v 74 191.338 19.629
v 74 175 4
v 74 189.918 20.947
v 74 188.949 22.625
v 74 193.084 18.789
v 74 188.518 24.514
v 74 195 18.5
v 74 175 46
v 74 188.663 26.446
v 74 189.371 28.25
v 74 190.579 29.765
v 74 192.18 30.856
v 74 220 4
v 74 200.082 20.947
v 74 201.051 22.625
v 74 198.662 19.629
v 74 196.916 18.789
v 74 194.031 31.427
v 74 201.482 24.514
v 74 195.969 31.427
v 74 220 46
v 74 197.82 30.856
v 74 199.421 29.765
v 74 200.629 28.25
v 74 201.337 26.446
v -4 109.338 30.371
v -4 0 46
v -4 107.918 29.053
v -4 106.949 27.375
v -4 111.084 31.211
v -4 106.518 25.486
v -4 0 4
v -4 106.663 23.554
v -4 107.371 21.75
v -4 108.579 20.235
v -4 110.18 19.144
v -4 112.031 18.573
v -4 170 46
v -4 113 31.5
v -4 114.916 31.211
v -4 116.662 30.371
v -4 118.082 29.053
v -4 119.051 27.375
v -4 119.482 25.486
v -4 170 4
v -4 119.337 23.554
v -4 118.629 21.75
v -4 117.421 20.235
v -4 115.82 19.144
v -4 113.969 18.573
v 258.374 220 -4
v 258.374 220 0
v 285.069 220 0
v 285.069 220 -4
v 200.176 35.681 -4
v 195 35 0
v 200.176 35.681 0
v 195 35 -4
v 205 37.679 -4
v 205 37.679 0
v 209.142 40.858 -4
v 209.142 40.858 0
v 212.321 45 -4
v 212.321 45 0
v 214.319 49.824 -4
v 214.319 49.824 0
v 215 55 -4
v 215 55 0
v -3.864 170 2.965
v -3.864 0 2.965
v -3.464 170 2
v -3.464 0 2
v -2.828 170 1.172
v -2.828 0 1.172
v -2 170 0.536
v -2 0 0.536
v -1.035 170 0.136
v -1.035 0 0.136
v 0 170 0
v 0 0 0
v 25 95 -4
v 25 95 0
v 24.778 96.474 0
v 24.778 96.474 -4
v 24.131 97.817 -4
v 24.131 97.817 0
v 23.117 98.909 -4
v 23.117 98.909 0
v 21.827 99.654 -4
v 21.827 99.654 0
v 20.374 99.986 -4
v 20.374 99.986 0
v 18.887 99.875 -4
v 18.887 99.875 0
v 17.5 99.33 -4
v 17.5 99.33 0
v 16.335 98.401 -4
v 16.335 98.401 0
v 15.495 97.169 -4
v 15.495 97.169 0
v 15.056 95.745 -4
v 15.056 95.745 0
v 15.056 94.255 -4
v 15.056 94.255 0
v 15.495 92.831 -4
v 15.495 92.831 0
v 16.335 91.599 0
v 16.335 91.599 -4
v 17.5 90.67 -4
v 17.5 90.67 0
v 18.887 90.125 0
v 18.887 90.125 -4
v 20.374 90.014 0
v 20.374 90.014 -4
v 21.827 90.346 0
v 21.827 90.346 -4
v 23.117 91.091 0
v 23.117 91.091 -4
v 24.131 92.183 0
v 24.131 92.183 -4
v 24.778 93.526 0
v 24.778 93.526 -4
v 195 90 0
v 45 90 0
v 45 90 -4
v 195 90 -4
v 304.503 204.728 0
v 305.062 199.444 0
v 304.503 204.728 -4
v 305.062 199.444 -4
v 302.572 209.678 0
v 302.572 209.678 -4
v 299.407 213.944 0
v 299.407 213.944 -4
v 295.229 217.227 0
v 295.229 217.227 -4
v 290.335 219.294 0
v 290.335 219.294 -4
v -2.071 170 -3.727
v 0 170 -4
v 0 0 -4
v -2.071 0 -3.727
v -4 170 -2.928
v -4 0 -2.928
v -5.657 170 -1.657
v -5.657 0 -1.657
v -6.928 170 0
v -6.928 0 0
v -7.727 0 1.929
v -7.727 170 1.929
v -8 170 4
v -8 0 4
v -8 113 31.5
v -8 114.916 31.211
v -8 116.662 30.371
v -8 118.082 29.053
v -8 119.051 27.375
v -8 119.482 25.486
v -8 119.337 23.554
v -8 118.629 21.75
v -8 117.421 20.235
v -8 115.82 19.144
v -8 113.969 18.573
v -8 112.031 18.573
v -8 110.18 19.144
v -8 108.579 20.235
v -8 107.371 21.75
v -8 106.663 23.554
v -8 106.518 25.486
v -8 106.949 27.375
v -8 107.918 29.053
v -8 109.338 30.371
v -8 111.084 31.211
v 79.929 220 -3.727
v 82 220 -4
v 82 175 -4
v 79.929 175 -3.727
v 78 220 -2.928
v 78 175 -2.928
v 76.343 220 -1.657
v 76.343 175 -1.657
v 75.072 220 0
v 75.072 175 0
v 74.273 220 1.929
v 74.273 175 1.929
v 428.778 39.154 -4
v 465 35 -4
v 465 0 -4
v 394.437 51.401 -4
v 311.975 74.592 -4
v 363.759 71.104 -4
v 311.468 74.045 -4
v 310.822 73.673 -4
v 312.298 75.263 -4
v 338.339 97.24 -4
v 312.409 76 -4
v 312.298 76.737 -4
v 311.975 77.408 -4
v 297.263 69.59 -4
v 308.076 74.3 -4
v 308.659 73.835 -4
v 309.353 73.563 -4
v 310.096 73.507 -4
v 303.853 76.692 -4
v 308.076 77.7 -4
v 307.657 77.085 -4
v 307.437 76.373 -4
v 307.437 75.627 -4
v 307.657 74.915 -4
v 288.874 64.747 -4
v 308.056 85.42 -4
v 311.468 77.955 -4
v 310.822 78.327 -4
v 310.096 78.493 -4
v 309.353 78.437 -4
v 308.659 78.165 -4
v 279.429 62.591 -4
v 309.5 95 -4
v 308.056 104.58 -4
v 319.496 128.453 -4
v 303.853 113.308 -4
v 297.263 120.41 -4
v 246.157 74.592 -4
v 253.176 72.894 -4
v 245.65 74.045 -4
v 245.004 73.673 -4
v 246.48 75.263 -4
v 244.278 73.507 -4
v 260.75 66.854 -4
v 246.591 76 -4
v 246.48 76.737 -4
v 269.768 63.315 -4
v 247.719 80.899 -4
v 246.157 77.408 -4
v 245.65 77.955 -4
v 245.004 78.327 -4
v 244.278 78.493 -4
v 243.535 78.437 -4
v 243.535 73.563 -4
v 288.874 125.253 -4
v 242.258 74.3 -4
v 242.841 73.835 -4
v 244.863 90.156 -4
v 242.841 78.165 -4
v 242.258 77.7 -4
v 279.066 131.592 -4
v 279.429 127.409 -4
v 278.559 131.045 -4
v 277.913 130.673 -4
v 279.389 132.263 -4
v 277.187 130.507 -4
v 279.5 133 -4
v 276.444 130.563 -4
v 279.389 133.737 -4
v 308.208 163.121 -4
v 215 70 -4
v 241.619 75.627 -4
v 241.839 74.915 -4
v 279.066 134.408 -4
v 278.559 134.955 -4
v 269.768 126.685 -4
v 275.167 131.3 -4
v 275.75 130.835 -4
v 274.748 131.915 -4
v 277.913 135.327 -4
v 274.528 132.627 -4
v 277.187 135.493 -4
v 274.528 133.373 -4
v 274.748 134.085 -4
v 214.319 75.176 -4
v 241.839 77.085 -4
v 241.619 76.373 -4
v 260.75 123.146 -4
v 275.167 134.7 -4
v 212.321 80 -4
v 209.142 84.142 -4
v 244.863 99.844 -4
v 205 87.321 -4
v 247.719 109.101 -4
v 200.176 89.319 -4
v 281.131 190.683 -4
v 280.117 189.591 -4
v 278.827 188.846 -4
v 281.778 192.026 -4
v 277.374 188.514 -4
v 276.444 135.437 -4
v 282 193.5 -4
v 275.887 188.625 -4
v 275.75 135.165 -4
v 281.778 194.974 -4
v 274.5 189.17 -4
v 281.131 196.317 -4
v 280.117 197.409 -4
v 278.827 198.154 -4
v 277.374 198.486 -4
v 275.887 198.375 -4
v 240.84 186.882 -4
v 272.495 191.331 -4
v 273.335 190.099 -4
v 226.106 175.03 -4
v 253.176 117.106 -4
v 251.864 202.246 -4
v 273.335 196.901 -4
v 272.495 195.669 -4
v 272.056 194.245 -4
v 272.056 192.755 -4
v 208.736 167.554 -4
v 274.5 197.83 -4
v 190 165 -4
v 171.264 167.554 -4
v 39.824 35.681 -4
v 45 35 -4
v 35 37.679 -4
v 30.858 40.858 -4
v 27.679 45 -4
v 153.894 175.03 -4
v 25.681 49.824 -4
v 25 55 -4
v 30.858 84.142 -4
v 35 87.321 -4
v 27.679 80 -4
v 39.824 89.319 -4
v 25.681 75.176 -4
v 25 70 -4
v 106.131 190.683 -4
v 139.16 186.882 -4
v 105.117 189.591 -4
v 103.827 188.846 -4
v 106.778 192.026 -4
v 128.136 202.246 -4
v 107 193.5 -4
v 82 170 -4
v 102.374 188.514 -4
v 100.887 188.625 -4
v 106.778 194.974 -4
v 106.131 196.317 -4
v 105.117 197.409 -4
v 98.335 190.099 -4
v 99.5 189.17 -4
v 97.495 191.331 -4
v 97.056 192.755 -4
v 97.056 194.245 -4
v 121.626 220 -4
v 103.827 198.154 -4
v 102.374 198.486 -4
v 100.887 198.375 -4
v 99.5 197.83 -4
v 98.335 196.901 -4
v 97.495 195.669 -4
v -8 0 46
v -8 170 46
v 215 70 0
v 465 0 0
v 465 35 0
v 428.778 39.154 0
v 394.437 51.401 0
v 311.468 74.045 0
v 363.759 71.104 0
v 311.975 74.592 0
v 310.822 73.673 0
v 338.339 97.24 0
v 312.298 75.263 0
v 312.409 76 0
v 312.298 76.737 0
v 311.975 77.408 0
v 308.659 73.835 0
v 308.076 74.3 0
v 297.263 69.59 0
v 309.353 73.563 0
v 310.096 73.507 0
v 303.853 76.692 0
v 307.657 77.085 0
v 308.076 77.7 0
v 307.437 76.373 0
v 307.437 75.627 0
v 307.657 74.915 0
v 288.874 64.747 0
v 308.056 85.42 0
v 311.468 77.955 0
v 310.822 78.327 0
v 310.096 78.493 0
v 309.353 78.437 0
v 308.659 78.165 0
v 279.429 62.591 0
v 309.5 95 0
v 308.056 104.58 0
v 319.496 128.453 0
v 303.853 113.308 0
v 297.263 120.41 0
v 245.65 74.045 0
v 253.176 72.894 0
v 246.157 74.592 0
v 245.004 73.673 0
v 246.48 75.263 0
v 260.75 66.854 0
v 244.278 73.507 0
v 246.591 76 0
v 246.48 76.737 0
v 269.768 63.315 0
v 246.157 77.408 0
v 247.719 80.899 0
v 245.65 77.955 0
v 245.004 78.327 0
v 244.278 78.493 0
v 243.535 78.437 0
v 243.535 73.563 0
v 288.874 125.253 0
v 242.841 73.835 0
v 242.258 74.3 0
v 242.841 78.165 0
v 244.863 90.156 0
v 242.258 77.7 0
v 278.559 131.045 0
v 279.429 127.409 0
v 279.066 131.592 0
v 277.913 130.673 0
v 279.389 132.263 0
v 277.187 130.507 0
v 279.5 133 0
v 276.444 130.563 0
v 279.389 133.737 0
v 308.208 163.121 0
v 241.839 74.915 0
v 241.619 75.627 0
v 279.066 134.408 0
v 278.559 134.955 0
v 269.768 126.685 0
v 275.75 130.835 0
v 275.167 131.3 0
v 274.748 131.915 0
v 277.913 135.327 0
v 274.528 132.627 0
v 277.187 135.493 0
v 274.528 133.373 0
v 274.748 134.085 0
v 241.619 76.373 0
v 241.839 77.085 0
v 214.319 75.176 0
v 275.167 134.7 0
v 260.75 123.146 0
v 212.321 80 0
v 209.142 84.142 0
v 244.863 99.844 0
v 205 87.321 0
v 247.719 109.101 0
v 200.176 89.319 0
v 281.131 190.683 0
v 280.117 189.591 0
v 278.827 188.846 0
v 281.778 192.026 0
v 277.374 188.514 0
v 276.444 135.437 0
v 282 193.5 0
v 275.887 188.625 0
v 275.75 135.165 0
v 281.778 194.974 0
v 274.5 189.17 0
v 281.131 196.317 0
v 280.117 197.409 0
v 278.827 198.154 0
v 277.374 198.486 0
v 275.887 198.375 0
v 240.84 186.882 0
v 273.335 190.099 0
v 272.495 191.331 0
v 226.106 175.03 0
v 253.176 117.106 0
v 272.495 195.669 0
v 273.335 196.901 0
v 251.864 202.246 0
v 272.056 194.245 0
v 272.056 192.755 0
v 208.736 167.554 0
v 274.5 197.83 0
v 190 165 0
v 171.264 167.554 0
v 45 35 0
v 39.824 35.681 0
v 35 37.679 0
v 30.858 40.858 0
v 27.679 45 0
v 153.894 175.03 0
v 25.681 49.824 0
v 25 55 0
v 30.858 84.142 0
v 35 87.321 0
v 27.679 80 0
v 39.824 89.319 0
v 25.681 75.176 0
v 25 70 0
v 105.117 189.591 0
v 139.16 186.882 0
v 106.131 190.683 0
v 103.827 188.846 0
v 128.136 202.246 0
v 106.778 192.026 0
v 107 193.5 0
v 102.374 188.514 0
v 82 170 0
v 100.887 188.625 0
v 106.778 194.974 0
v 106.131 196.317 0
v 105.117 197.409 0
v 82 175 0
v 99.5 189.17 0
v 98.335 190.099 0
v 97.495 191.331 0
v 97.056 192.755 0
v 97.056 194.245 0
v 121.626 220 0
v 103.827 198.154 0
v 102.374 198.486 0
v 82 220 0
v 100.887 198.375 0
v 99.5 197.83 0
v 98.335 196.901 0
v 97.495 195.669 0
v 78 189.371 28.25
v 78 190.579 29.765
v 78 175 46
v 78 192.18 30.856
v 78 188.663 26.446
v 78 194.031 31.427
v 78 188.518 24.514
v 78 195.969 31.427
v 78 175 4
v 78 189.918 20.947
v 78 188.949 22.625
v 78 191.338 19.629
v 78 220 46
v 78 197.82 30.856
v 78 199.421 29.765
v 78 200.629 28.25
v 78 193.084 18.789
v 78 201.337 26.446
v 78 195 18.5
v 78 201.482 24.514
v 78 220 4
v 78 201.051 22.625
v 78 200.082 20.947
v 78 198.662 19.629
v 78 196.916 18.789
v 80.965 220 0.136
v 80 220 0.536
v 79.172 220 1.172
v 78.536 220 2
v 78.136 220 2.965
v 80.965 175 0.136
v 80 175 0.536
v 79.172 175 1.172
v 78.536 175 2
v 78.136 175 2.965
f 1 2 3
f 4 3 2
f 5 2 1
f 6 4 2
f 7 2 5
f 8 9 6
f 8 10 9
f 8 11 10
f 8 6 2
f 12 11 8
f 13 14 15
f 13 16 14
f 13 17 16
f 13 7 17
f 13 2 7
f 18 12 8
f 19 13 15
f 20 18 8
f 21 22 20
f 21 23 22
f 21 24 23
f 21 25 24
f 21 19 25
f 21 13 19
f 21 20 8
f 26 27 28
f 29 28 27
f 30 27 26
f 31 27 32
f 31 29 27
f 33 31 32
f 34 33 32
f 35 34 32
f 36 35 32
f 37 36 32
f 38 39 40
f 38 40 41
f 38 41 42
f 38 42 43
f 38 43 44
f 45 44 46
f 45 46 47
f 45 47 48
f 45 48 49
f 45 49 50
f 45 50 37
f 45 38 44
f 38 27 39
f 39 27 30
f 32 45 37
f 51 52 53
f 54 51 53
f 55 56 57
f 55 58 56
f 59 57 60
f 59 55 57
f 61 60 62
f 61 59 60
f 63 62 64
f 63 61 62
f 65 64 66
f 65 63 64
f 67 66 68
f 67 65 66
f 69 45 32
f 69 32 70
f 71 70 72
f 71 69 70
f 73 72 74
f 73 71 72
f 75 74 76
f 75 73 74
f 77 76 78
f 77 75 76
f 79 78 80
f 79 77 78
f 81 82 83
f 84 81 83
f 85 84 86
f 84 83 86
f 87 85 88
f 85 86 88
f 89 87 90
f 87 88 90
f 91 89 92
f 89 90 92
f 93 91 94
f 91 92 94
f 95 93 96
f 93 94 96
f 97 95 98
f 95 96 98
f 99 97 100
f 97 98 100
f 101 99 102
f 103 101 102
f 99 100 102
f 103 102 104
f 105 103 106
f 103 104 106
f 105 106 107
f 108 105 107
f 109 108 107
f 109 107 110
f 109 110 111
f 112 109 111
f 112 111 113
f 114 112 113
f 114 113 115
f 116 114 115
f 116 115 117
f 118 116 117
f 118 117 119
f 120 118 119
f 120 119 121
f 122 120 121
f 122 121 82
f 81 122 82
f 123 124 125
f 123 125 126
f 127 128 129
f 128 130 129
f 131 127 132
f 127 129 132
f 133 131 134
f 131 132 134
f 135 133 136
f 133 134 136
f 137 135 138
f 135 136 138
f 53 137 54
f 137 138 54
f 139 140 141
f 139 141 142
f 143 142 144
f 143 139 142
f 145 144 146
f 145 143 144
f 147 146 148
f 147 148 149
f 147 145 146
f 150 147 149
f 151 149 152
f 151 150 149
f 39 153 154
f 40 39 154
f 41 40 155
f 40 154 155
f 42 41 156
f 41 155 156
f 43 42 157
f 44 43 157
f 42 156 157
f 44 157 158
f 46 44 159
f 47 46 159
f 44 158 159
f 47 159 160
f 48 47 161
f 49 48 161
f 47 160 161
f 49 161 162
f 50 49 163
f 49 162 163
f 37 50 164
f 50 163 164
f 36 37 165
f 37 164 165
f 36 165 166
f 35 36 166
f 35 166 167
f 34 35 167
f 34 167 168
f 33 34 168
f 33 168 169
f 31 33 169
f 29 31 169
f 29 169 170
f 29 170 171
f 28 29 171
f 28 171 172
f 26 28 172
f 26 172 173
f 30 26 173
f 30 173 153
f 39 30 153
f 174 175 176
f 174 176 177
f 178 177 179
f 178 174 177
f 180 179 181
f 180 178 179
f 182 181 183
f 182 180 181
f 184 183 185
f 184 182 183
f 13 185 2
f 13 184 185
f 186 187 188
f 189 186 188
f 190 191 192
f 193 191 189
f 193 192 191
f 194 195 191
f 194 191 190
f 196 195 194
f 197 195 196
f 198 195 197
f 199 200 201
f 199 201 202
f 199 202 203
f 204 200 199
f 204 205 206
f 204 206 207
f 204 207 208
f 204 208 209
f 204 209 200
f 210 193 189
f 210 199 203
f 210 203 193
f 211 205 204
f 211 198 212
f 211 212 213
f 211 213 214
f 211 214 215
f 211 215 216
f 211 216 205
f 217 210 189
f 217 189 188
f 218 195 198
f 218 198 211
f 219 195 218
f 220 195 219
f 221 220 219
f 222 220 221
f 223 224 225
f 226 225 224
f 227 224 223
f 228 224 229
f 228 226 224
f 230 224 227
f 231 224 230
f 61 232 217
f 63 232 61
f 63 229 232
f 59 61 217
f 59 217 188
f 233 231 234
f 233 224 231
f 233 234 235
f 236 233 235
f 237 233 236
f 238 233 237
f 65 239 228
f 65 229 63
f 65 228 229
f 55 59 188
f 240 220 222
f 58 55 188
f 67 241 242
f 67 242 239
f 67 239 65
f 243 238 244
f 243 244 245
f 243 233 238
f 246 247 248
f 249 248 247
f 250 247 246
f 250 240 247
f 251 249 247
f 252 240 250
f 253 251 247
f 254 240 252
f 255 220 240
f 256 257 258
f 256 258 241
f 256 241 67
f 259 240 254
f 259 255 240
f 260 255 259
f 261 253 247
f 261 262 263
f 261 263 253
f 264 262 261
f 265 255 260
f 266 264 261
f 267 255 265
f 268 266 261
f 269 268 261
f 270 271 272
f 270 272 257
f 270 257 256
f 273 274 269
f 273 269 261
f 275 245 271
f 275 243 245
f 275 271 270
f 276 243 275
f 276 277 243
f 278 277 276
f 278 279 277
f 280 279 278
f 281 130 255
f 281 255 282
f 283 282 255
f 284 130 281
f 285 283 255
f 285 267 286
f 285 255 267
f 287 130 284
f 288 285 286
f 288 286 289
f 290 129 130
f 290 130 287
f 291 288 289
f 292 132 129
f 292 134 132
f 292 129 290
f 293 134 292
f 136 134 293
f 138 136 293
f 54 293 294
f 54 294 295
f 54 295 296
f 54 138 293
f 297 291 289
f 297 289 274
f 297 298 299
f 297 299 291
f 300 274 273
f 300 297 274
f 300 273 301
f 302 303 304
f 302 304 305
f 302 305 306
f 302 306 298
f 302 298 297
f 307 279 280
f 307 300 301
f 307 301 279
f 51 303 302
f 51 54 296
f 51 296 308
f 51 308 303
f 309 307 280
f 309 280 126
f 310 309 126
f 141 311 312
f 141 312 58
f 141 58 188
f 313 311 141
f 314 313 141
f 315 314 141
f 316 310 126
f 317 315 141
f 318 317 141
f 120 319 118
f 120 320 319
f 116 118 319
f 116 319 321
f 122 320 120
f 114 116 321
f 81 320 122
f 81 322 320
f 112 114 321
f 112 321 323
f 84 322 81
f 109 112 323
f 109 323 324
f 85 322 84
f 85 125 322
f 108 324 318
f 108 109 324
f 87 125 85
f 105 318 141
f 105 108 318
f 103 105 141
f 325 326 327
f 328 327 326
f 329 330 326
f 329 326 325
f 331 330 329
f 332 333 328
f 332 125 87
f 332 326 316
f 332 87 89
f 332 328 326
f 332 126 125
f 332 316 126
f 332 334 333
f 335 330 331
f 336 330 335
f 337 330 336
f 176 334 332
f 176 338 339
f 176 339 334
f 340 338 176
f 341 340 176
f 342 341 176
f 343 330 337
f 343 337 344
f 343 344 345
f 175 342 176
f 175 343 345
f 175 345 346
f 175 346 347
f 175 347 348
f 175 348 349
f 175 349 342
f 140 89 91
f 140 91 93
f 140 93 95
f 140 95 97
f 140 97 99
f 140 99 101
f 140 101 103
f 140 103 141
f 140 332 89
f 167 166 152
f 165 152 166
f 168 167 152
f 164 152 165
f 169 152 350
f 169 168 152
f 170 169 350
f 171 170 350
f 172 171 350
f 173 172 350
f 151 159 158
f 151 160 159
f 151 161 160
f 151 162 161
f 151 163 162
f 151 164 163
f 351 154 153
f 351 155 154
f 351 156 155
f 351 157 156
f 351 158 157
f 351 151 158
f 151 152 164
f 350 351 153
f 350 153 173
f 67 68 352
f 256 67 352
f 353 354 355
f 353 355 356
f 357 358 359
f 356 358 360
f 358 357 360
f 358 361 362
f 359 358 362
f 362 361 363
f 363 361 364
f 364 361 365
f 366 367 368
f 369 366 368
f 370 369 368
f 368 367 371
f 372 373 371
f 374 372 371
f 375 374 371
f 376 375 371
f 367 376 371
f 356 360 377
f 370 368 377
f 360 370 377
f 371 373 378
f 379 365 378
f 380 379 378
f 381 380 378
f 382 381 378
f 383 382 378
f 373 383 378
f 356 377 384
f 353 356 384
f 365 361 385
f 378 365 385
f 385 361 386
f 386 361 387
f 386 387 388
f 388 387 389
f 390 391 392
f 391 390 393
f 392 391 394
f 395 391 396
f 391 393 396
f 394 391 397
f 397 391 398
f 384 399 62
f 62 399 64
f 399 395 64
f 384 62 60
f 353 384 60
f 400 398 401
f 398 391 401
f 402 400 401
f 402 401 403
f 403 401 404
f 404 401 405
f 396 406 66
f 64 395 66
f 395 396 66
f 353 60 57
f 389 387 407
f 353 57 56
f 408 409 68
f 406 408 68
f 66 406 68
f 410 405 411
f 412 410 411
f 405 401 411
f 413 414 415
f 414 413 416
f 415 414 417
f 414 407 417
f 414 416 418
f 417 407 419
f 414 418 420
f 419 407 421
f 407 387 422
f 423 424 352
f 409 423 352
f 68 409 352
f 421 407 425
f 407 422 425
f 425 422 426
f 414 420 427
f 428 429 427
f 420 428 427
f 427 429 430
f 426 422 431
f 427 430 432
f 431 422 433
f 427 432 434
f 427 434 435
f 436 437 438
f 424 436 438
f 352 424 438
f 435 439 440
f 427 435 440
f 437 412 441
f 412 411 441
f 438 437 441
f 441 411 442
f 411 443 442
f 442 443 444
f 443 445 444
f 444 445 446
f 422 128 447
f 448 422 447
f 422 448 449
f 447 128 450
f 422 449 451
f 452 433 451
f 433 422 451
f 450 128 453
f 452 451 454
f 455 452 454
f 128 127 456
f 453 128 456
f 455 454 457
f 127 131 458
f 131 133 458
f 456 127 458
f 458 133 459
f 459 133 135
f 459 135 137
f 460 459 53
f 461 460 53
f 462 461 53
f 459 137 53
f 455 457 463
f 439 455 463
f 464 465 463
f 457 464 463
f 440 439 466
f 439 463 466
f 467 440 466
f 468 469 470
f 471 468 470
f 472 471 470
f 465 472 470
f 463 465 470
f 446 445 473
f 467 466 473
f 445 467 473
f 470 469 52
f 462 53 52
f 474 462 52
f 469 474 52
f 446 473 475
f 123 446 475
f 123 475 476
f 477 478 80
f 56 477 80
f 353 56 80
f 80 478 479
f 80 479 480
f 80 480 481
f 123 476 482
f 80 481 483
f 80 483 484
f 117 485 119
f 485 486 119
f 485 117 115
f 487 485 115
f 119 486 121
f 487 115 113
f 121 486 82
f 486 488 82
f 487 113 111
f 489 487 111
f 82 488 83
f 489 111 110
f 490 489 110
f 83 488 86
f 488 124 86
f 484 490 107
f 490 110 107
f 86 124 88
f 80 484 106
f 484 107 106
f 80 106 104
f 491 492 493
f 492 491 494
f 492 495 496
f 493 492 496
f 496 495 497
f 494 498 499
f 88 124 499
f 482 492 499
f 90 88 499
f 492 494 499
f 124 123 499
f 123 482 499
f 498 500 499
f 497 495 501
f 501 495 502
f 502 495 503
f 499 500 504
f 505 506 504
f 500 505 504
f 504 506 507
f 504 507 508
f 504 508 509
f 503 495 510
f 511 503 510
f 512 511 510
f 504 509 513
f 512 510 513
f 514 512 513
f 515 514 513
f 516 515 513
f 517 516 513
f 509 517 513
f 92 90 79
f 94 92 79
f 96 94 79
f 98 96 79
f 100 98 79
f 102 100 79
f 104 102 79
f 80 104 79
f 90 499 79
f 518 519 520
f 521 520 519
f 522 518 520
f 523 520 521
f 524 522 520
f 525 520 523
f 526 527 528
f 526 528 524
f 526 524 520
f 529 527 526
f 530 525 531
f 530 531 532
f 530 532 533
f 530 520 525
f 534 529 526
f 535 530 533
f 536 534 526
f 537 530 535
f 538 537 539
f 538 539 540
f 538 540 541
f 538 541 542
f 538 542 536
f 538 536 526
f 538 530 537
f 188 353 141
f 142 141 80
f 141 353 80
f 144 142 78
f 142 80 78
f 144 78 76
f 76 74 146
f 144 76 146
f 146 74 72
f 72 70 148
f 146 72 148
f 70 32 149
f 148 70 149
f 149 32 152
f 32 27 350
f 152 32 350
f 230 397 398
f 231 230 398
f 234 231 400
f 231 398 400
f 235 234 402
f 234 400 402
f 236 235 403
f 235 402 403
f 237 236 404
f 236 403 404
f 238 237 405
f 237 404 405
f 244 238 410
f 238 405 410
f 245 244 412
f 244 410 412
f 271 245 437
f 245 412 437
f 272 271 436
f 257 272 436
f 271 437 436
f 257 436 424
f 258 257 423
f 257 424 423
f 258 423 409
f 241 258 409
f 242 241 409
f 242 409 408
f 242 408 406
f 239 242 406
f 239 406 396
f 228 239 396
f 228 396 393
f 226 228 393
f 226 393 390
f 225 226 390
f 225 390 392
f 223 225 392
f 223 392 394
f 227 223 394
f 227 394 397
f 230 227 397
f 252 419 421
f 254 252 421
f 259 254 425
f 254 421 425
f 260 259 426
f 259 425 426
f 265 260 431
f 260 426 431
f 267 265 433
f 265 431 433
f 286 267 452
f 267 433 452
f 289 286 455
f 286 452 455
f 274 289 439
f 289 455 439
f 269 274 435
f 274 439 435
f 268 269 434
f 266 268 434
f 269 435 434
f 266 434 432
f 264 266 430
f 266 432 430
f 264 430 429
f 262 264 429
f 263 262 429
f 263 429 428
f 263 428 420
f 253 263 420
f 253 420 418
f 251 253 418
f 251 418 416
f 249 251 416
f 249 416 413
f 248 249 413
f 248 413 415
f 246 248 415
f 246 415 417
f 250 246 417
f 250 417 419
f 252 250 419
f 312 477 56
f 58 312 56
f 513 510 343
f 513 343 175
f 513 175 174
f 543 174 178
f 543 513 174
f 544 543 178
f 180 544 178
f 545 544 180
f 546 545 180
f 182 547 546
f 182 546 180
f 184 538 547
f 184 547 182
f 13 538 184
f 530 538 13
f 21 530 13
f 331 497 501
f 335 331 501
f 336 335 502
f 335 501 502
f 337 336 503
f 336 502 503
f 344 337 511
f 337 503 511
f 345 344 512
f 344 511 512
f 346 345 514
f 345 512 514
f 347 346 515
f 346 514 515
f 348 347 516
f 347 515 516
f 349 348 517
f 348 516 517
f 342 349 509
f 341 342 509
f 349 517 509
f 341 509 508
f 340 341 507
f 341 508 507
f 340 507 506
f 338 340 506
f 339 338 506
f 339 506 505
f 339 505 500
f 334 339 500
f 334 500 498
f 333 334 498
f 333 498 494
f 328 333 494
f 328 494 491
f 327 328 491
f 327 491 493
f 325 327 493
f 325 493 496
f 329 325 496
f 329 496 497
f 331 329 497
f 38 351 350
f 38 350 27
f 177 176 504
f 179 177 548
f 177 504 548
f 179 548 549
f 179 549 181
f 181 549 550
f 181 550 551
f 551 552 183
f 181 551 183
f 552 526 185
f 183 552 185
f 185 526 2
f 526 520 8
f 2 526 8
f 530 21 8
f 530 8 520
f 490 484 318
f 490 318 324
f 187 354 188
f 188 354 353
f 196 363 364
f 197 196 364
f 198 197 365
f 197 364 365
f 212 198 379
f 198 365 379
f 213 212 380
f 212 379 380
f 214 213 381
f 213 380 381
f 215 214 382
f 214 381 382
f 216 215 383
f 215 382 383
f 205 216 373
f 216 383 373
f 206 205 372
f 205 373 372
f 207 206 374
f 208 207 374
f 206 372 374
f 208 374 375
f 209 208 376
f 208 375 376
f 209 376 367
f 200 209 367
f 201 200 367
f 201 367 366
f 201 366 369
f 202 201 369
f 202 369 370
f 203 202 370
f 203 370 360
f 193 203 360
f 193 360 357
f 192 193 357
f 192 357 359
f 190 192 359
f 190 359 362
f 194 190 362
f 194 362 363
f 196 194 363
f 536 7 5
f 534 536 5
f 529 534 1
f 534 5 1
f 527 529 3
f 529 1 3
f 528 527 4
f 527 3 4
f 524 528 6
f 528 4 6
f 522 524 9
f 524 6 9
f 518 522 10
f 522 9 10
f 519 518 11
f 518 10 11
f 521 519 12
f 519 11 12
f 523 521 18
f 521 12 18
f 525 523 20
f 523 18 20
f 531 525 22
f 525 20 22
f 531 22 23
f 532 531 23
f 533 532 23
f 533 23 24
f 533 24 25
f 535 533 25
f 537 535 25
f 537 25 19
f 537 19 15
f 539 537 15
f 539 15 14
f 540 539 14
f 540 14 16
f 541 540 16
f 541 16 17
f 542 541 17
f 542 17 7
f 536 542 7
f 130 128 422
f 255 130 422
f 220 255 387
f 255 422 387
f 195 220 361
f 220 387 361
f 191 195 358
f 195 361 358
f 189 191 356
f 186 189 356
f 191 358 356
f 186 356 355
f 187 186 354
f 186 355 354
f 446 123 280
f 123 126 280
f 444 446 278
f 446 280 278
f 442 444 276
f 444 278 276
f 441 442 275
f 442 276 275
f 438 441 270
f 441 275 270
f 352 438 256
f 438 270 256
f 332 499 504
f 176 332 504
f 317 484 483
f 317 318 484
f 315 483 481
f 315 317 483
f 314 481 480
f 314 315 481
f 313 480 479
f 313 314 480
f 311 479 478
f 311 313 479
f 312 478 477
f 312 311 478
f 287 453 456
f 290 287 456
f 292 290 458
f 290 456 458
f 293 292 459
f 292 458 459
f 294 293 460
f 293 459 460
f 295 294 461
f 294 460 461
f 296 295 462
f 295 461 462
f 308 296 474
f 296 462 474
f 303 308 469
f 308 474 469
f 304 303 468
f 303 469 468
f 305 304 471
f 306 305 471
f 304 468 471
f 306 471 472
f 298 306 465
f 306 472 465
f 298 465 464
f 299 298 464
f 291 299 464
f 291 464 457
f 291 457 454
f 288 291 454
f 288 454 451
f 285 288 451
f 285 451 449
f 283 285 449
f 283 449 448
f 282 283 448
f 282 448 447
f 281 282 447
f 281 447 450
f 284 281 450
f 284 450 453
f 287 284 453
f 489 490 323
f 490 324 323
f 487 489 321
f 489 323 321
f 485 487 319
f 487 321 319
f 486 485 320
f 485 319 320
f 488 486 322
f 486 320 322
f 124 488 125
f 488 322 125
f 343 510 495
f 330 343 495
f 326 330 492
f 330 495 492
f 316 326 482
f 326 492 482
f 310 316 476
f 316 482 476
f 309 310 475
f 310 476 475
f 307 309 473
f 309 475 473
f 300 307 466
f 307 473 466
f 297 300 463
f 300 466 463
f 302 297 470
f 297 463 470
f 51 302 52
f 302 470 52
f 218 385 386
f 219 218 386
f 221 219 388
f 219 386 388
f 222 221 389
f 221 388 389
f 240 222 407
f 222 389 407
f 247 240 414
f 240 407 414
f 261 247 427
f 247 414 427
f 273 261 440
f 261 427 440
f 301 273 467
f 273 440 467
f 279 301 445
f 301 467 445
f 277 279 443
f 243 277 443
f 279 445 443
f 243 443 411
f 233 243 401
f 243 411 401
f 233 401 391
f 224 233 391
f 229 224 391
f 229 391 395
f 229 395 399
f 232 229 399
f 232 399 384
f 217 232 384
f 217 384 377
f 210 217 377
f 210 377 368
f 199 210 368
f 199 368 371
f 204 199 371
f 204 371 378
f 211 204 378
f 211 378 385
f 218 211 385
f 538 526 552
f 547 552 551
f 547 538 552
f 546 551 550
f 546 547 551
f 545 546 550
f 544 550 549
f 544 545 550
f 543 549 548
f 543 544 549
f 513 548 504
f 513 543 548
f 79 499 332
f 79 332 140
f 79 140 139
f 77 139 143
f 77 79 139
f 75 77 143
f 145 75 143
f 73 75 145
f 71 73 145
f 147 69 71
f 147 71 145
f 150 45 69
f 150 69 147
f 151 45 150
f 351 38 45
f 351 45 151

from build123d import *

# Parameters (mm, degrees)
SKETCH_1_W                  = 190
SKETCH_1_H                  = 55
SM_BASE_FLANGE_1_DEPTH      = 4
SKETCH_6_R                  = 32.5
SKETCH_6_R_2                = 2.5
CUT_EXTRUDE_1_DEPTH         = 10
SKETCH_7_R                  = 5
CUT_EXTRUDE_2_DEPTH         = 10
FILLET_1_R                  = 20
FILLET_2_R                  = 20
SM_EDGE_FLANGE_1_DEPTH      = 45
SM_EDGE_FLANGE_1_BEND_DEPTH = 170
CUT_EXTRUDE_4_REACH         = 525.684
SKETCH_15_R                 = 6.5


# Sheet-metal steps are written as plain solids
with BuildPart() as part:
    # Sketch 1 → 基体-法兰1 (new body)
    with BuildSketch(Plane.XY):
        with BuildLine():
            Line((0, 0), (0, 170))
            Line((0, 170), (82, 170))
            Line((82, 170), (82, 220))
            Line((82, 220), (121.626028344, 220))
            ThreePointArc((121.626028344, 220), (190, 165), (258.373971656, 220))
            Line((258.373971656, 220), (306.965193707, 220))
            ThreePointArc((306.965193707, 220), (343.344749394, 91.076951546), (465, 35))
            Line((465, 35), (465, 0))
            Line((465, 0), (0, 0))
        make_face()
        with Locations((120, 62.5)):
            Rectangle(SKETCH_1_W, SKETCH_1_H, mode=Mode.SUBTRACT)
    extrude(amount=-SM_BASE_FLANGE_1_DEPTH)

    # 草图6 → 切除-拉伸1 (cut)
    with BuildSketch(Plane.XY):
        with Locations((277, 95)):
            Circle(SKETCH_6_R)
        with Locations((277, 133)):
            Circle(SKETCH_6_R_2)
        with Locations((309.908965344, 76)):
            Circle(SKETCH_6_R_2)
        with Locations((244.091034656, 76)):
            Circle(SKETCH_6_R_2)
    extrude(amount=-CUT_EXTRUDE_1_DEPTH, mode=Mode.SUBTRACT)

    # 草图7 → 切除-拉伸2 (cut)
    with BuildSketch(Plane.XY):
        with Locations((20, 95)):
            Circle(SKETCH_7_R)
        with Locations((102, 193.5)):
            Circle(SKETCH_7_R)
        with Locations((277, 193.5)):
            Circle(SKETCH_7_R)
    extrude(amount=-CUT_EXTRUDE_2_DEPTH, mode=Mode.SUBTRACT)

    # 圆角1
    fillet_1_edges = [part.edges().sort_by_distance(p)[0] for p in [
        (25, 35, -2),
        (25, 90, -2),
        (215, 90, -2),
        (215, 35, -2),
    ]]
    fillet(fillet_1_edges, radius=FILLET_1_R)

    # 圆角2
    fillet_2_edges = [part.edges().sort_by_distance(p)[0] for p in [
        (306.965193707, 220, -2),
    ]]
    fillet(fillet_2_edges, radius=FILLET_2_R)

    # 边线-法兰1 section (across the edge) → 边线-法兰1 (add)
    with BuildSketch(Plane(origin=(78, 220, 0), x_dir=(1, 0, 0), z_dir=(0, -1, 0))):
        with BuildLine():
            Line((-4, 4), (-4, 46))
            Line((-4, 46), (0, 46))
            Line((0, 46), (0, 4))
            ThreePointArc((0, 4), (1.171572875, 1.171572875), (4, 0))
            Line((4, 0), (4, -4))
            ThreePointArc((4, -4), (-1.656854249, -1.656854249), (-4, 4))
        make_face()
    extrude(amount=SM_EDGE_FLANGE_1_DEPTH)

    # 边线-法兰1 section 2 (across the edge) → 边线-法兰1 bend (add)
    with BuildSketch(Plane(origin=(-4, 170, 0), x_dir=(1, 0, 0), z_dir=(0, -1, 0))):
        with BuildLine():
            Line((-4, 4), (-4, 46))
            Line((-4, 46), (0, 46))
            Line((0, 46), (0, 4))
            ThreePointArc((0, 4), (1.171572875, 1.171572875), (4, 0))
            Line((4, 0), (4, -4))
            ThreePointArc((4, -4), (-1.656854249, -1.656854249), (-4, 4))
        make_face()
    extrude(amount=SM_EDGE_FLANGE_1_BEND_DEPTH)

    # 草图15 → 切除-拉伸4 (cut, up to next)
    with BuildSketch(Plane.ZY.offset(8), mode=Mode.PRIVATE) as cut_extrude_4_sk1:
        with Locations((25, 113)):
            Circle(SKETCH_15_R)
    cut_extrude_4_tool1 = extrude(cut_extrude_4_sk1.sketch, amount=-CUT_EXTRUDE_4_REACH, mode=Mode.PRIVATE) & part.part
    # 草图15 → 切除-拉伸4 (cut, up to next)
    with BuildSketch(Plane.ZY.offset(8), mode=Mode.PRIVATE) as cut_extrude_4_sk2:
        with Locations(Location((25, 195, 0), (0, 0, 180))):
            Circle(SKETCH_15_R)
    cut_extrude_4_tool2 = extrude(cut_extrude_4_sk2.sketch, amount=-CUT_EXTRUDE_4_REACH, mode=Mode.PRIVATE) & part.part
    add(cut_extrude_4_tool1.solids().sort_by_distance((-8, 113, 25))[0], mode=Mode.SUBTRACT)
    add(cut_extrude_4_tool2.solids().sort_by_distance((-8, 195, 25))[0], mode=Mode.SUBTRACT)


solid = part.part
